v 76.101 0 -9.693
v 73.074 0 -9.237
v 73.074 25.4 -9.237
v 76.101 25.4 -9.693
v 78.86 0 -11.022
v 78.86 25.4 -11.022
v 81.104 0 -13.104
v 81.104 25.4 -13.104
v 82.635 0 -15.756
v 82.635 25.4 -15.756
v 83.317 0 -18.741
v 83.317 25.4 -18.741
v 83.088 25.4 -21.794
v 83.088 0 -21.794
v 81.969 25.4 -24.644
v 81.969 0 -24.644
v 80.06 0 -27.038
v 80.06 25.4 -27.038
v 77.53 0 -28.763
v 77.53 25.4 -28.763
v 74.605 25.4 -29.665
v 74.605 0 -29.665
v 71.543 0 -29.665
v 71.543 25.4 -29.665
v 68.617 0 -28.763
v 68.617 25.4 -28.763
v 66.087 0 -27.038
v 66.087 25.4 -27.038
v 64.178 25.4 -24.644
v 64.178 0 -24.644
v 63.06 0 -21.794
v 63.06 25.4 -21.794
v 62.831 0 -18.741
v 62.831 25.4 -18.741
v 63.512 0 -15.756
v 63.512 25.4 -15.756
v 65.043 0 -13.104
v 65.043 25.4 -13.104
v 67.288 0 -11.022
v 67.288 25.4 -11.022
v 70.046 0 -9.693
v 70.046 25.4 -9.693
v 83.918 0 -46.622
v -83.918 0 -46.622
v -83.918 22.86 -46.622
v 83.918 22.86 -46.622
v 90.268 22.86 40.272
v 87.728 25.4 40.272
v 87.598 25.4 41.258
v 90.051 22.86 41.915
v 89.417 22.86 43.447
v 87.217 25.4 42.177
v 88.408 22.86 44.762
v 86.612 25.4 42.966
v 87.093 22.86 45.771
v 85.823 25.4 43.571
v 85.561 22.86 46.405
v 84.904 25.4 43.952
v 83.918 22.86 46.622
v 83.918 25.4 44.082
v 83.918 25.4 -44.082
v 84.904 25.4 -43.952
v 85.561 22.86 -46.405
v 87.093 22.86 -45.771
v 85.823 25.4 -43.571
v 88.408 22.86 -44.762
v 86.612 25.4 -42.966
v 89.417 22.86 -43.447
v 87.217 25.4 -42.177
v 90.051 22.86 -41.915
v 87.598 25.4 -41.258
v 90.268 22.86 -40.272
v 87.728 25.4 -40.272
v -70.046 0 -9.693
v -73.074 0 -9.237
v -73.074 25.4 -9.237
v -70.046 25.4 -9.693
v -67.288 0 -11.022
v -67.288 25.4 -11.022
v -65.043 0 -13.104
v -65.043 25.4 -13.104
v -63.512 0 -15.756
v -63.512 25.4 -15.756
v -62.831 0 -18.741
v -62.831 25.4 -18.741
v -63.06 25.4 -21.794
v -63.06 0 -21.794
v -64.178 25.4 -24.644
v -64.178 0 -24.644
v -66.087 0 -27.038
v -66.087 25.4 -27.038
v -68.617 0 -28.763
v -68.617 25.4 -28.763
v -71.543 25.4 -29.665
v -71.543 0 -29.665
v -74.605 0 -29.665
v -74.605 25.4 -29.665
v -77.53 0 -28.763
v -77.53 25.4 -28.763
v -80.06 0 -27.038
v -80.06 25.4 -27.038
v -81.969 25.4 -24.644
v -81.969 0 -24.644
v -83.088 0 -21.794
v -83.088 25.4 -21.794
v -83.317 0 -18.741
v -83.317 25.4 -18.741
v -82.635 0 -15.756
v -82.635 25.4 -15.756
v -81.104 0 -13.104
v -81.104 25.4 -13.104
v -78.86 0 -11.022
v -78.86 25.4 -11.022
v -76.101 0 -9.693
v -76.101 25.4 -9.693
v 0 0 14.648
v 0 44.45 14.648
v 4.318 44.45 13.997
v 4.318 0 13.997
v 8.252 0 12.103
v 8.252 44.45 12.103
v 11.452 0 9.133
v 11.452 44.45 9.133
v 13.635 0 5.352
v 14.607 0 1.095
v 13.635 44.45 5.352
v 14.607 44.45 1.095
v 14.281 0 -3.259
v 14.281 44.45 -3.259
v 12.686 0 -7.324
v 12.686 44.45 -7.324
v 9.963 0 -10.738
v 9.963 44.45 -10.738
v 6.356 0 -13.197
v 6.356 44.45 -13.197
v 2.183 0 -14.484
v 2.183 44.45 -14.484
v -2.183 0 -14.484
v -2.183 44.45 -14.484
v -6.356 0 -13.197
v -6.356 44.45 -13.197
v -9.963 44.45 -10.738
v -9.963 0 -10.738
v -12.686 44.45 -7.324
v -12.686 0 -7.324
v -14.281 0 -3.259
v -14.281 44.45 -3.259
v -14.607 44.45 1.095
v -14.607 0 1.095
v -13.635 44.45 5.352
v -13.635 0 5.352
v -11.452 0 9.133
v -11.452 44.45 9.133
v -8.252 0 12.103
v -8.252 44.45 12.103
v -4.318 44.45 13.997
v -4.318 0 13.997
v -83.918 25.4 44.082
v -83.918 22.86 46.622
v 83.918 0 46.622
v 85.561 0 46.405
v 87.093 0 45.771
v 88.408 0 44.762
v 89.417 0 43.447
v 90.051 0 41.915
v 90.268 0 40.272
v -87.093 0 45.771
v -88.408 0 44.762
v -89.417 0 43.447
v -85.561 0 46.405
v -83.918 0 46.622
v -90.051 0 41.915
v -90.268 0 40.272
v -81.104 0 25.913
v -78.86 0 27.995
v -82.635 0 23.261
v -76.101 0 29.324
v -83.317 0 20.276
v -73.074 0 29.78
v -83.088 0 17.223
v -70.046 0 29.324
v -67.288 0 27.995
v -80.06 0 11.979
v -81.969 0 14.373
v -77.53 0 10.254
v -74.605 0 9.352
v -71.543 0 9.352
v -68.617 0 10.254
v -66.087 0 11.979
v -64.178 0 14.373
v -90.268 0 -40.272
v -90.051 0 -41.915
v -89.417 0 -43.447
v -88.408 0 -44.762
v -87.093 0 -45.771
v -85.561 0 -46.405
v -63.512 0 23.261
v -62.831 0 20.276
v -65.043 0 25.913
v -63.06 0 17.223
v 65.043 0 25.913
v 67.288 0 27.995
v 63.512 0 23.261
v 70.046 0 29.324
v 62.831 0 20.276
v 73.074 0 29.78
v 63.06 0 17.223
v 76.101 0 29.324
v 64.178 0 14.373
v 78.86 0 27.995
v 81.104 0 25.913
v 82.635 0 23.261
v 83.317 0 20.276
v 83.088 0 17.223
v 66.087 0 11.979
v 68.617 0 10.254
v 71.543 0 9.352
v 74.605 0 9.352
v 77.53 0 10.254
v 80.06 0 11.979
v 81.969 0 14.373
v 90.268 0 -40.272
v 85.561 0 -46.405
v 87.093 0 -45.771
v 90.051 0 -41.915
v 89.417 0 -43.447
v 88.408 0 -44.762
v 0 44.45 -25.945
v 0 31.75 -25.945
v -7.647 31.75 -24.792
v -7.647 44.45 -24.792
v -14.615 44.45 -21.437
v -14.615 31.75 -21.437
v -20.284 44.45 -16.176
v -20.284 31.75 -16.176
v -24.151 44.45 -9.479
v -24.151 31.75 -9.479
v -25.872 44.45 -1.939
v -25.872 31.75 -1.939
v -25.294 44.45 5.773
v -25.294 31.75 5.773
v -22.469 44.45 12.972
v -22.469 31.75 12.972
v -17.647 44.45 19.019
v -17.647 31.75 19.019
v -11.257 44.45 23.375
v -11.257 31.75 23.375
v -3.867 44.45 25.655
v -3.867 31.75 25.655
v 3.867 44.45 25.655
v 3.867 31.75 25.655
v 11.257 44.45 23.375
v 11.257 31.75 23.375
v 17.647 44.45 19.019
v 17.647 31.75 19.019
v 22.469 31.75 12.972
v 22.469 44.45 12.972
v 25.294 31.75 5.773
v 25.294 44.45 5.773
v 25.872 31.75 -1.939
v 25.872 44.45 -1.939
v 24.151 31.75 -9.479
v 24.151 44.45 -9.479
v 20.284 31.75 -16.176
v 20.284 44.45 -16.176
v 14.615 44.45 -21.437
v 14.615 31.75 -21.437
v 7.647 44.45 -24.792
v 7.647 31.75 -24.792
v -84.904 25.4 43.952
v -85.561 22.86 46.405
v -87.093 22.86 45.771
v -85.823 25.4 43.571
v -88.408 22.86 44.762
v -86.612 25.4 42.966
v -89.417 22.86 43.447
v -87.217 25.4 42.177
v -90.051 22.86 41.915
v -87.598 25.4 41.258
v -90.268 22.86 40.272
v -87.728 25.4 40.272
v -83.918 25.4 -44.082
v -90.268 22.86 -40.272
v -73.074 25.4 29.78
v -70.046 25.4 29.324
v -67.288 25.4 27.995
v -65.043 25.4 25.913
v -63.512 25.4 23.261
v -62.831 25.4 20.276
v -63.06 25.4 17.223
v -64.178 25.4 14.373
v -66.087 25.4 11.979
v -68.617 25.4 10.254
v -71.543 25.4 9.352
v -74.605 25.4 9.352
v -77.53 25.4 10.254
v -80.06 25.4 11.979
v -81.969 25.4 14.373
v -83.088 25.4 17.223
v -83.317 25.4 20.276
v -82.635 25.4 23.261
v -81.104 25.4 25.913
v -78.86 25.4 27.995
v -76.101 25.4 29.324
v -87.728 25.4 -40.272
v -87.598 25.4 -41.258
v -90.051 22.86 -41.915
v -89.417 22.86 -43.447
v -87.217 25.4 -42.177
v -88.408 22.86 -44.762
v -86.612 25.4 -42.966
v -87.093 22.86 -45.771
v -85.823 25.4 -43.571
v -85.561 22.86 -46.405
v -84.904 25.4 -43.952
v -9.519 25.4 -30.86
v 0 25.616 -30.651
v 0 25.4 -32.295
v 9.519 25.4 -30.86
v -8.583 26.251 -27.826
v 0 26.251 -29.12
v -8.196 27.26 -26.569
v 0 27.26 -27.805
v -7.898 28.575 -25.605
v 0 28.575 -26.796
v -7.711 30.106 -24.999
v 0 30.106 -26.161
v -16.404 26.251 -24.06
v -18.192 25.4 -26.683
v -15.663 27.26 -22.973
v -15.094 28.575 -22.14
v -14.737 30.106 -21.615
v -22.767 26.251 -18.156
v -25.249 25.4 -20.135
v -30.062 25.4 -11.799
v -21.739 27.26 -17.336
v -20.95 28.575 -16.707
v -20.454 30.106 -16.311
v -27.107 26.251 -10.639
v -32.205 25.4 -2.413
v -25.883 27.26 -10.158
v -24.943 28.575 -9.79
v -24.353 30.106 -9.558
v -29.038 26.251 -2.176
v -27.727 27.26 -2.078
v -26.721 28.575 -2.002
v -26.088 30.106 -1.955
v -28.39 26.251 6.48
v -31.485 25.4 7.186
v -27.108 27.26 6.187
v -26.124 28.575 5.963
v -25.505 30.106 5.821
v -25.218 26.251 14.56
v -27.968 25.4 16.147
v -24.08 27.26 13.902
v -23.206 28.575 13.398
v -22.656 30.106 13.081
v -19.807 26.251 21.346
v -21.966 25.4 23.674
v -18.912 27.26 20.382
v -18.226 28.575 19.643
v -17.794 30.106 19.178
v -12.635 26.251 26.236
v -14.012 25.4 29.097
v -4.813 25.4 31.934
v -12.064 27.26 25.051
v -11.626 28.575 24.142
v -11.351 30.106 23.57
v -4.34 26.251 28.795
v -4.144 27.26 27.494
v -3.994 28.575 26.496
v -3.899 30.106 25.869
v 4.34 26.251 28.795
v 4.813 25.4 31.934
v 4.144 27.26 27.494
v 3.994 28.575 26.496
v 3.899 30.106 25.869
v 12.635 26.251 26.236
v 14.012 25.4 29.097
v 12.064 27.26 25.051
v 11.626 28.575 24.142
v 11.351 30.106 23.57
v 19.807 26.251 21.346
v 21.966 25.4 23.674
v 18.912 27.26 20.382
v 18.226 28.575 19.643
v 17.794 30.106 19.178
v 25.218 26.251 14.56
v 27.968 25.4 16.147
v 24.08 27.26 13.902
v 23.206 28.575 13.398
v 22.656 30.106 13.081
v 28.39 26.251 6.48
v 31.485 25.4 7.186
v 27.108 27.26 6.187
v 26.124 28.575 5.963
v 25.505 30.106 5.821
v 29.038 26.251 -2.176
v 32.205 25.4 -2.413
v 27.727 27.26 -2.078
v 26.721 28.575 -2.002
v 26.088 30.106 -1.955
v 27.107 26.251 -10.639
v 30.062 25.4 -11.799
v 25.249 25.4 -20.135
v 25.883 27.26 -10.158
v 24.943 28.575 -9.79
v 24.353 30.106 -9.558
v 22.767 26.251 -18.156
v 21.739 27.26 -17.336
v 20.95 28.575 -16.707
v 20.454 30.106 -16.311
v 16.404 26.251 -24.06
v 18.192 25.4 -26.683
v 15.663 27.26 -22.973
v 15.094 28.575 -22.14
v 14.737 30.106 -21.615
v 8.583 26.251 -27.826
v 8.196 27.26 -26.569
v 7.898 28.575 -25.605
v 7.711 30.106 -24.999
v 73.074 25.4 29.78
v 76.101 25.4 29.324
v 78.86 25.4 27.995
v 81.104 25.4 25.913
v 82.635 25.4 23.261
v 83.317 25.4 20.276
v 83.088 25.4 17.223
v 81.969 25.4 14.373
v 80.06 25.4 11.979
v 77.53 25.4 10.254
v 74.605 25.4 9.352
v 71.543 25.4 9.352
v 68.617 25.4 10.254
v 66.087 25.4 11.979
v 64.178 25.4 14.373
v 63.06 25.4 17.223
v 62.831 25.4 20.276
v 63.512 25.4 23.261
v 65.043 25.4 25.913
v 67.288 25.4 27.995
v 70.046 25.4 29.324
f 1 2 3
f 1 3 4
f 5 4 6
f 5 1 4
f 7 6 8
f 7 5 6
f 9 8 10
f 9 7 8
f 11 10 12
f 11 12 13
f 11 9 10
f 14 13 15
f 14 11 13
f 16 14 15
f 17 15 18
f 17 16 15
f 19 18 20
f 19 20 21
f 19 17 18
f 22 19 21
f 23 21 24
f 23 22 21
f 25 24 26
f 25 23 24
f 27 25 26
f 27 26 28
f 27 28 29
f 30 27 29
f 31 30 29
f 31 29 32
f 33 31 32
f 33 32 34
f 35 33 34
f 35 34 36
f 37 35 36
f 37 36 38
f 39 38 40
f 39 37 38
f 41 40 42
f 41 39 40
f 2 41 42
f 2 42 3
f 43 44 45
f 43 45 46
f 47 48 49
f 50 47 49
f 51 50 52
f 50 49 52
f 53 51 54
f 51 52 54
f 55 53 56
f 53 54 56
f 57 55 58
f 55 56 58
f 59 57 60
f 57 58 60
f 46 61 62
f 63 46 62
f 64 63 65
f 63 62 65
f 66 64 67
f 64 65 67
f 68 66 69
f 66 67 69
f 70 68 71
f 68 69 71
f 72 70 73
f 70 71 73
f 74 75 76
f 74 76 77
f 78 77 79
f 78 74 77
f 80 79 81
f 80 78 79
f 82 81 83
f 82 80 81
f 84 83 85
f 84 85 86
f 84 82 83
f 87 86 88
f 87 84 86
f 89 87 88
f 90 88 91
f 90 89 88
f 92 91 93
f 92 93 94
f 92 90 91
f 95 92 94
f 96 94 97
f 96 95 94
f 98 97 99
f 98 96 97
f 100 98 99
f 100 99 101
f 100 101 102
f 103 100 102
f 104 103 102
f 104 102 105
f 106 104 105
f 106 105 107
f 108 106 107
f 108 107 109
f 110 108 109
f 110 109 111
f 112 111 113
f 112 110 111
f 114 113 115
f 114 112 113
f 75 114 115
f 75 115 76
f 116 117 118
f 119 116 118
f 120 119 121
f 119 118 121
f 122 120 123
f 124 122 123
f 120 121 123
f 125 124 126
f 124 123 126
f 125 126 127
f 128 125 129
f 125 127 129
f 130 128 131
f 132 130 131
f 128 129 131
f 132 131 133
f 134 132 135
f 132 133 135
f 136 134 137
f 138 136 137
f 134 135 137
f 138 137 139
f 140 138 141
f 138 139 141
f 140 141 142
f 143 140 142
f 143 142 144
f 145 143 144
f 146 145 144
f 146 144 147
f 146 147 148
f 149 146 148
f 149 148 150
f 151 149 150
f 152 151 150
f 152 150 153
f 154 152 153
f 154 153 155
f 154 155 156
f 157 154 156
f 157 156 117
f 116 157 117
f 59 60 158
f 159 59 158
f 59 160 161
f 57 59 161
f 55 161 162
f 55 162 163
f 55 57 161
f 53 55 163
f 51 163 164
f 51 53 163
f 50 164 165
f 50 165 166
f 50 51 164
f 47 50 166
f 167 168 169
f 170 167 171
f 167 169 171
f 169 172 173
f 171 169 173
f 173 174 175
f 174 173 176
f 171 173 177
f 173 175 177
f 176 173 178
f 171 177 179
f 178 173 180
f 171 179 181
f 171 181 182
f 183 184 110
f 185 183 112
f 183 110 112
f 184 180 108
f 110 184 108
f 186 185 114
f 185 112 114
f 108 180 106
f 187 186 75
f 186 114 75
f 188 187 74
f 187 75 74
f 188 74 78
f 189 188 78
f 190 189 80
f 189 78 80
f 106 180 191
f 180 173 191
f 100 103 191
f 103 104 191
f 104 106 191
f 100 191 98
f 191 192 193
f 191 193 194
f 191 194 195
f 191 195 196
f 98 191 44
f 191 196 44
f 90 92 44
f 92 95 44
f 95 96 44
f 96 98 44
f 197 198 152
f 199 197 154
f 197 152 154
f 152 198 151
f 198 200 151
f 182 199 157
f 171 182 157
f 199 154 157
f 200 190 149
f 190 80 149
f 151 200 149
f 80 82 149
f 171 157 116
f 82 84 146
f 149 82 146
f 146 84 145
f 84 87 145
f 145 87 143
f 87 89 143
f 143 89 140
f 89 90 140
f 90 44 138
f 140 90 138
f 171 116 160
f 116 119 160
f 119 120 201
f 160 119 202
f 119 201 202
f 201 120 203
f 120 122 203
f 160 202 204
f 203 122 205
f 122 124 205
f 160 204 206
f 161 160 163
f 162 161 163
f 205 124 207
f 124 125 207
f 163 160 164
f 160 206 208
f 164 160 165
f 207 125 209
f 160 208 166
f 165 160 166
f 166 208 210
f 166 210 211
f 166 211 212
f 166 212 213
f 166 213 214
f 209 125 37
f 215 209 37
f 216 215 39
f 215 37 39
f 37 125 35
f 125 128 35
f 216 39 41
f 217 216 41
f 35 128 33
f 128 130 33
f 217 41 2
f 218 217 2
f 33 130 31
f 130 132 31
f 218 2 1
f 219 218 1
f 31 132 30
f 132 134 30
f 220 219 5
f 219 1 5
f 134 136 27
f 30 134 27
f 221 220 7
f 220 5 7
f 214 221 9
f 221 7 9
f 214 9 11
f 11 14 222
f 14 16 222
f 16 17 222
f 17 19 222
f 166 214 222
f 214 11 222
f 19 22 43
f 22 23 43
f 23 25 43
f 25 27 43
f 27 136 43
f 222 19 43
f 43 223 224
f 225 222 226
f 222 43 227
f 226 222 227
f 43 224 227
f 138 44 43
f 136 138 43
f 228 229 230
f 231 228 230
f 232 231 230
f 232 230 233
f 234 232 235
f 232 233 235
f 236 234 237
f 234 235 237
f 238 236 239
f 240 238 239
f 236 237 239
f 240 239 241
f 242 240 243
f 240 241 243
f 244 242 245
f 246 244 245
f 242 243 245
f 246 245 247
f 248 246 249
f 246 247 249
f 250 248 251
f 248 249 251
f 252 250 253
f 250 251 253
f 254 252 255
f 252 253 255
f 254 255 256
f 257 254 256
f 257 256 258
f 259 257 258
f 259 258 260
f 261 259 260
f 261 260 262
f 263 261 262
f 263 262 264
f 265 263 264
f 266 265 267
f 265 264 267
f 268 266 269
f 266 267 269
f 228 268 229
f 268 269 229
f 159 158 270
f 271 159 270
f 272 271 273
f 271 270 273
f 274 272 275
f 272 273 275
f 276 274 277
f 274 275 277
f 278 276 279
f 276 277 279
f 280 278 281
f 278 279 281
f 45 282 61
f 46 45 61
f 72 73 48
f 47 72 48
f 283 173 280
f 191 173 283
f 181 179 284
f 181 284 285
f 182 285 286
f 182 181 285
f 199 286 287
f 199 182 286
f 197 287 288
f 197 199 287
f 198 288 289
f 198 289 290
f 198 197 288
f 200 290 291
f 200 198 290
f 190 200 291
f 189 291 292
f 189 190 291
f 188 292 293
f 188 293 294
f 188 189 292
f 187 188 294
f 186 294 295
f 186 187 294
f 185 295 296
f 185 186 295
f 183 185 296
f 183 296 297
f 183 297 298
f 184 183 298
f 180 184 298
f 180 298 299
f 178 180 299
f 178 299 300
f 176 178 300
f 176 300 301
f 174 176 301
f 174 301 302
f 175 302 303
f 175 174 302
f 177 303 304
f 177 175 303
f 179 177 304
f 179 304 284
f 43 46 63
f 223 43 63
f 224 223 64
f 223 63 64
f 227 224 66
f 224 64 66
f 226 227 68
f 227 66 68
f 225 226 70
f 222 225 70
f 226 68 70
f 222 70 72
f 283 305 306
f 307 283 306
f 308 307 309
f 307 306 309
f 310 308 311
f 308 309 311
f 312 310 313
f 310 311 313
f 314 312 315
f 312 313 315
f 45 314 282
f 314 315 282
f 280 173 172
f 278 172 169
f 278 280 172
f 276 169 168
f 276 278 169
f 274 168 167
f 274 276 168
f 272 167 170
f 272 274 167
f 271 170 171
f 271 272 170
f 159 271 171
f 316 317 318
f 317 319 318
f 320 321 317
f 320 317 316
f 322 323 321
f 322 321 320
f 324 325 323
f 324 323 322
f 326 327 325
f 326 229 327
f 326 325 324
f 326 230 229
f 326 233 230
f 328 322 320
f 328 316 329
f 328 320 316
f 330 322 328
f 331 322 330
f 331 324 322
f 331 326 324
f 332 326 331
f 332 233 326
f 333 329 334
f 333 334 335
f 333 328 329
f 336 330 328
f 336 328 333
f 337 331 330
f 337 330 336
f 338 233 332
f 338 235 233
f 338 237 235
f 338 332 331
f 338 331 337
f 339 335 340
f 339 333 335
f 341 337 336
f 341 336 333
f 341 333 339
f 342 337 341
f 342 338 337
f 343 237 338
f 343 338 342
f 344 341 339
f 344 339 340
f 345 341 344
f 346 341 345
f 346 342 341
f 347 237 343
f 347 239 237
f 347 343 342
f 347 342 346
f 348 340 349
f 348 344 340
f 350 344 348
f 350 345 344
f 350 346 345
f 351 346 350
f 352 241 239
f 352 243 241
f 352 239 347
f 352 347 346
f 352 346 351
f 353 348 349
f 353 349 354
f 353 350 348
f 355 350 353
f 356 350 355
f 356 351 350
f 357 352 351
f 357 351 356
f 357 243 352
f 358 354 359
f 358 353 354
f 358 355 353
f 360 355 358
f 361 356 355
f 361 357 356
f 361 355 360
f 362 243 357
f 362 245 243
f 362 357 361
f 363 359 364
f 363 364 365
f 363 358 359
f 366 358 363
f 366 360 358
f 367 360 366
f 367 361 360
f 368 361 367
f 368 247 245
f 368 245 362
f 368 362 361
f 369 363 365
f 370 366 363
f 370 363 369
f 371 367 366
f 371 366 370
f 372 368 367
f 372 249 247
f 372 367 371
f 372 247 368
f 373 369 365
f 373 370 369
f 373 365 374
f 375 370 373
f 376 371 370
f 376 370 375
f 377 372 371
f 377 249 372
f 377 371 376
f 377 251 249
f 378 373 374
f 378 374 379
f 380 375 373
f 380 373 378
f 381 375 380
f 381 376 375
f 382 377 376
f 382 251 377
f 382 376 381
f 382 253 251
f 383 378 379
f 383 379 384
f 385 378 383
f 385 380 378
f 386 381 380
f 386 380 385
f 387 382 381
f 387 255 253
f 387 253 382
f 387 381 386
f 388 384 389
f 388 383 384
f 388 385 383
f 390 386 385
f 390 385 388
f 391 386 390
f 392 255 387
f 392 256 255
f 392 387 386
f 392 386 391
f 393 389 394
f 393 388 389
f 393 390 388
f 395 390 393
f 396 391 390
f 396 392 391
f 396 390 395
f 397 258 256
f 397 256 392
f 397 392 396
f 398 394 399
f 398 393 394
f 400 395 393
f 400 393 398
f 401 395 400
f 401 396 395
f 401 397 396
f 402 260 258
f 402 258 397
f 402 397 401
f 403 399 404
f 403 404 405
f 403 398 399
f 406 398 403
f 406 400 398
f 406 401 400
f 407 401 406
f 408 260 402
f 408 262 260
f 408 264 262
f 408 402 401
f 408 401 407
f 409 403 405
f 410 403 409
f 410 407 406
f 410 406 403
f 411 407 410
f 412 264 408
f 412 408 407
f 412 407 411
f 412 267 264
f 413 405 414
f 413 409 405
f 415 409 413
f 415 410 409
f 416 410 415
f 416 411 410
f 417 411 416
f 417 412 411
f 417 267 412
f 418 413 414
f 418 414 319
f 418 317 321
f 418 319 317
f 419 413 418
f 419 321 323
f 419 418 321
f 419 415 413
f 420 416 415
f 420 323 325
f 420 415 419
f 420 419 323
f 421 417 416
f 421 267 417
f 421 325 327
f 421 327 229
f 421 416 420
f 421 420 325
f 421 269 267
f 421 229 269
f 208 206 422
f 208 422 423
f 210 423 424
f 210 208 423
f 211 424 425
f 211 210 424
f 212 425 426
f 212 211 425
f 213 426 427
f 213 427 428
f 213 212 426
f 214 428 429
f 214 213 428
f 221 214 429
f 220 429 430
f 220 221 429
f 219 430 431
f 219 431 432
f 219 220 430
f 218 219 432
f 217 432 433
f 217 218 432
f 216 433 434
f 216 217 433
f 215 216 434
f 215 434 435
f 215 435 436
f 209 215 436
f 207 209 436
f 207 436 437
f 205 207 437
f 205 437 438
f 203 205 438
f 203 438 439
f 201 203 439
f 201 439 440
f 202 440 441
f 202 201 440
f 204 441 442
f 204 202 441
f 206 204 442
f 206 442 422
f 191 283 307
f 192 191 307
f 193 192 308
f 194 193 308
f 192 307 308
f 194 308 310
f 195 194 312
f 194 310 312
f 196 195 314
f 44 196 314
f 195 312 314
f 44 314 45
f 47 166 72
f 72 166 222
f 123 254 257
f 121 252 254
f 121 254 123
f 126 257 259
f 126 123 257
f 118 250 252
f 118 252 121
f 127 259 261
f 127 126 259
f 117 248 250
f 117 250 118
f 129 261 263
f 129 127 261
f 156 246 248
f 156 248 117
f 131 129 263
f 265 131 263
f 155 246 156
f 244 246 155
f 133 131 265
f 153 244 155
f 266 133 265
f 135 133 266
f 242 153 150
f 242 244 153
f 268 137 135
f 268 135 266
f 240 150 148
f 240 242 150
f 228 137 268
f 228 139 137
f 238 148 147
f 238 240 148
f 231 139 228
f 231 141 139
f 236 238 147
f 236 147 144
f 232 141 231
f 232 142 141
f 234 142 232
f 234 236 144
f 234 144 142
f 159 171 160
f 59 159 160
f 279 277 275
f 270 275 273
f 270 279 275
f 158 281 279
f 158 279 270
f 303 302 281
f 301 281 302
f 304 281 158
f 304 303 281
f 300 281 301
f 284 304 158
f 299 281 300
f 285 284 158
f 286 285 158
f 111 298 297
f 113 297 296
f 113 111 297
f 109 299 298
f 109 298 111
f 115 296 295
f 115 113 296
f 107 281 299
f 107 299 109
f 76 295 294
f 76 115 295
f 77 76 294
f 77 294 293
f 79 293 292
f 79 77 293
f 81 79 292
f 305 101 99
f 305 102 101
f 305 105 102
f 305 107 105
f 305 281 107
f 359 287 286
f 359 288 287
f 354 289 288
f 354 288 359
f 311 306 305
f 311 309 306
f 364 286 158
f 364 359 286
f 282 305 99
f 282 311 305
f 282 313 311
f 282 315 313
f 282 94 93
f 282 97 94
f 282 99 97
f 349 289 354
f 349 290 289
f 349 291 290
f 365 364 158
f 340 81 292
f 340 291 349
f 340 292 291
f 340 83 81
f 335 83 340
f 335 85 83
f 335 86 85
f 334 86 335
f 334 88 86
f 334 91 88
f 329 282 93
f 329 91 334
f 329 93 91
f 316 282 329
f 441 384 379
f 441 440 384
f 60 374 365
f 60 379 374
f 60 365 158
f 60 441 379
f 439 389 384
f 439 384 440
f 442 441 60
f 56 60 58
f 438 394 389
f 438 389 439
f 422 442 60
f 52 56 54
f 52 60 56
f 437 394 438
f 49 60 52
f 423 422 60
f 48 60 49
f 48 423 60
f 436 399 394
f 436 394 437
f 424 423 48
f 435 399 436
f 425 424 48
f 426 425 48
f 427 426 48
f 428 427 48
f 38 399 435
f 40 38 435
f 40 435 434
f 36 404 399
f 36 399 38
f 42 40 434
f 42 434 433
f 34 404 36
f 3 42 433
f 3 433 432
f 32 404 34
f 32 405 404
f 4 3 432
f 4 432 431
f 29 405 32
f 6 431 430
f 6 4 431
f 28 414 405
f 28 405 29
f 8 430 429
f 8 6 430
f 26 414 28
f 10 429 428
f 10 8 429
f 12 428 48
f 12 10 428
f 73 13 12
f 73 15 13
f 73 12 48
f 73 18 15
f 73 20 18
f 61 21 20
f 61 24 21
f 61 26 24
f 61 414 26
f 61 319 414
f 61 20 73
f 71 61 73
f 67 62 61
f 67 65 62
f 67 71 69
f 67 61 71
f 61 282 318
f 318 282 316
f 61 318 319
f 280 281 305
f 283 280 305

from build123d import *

# Parameters (mm, degrees)
SKETCH1_W           = 180.535384616
SKETCH1_H           = 93.243550296
SKETCH1_R           = 10.271487678
BOSS_EXTRUDE1_DEPTH = 25.4
SKETCH2_R           = 25.944815363
BOSS_EXTRUDE2_DEPTH = 19.05
SKETCH3_R           = 14.648002934
CUT_EXTRUDE1_DEPTH  = 111.894764045
FILLET2_R           = 6.35
CHAMFER1_SIZE       = 2.54


with BuildPart() as part:
    # Sketch1 → Boss-Extrude1 (new body)
    with BuildSketch(Plane(origin=(0, 0, 0), x_dir=(1, 0, 0), z_dir=(0, 1, 0))):
        Rectangle(SKETCH1_W, SKETCH1_H)
        with Locations(Location((73.073846154, 19.508402367, 0), (0, 0, 270))):
            Circle(SKETCH1_R, mode=Mode.SUBTRACT)
        with Locations(Location((-73.073846154, 19.508402367, 0), (0, 0, 270))):
            Circle(SKETCH1_R, mode=Mode.SUBTRACT)
        with Locations(Location((73.073846154, -19.508402367, 0), (0, 0, 270))):
            Circle(SKETCH1_R, mode=Mode.SUBTRACT)
        with Locations(Location((-73.073846154, -19.508402367, 0), (0, 0, 270))):
            Circle(SKETCH1_R, mode=Mode.SUBTRACT)
    extrude(amount=BOSS_EXTRUDE1_DEPTH)

    # Sketch2 → Boss-Extrude2 (add)
    with BuildSketch(Plane(origin=(0, 25.4, 0), x_dir=(1, 0, 0), z_dir=(0, 1, 0))):
        with Locations(Location((0, 0, 0), (0, 0, 90))):
            Circle(SKETCH2_R)
    extrude(amount=BOSS_EXTRUDE2_DEPTH)

    # Sketch3 → Cut-Extrude1 (cut, through all)
    with BuildSketch(Plane(origin=(0, 44.45, 0), x_dir=(1, 0, 0), z_dir=(0, 1, 0))):
        with Locations(Location((0, 0, 0), (0, 0, 270))):
            Circle(SKETCH3_R)
    extrude(amount=-CUT_EXTRUDE1_DEPTH, mode=Mode.SUBTRACT)

    # Fillet2
    fillet2_edges = [part.edges().sort_by_distance(p)[0] for p in [
        (-90.267692308, 12.7, 46.621775148),
        (-90.267692308, 12.7, -46.621775148),
        (90.267692308, 12.7, -46.621775148),
        (90.267692308, 12.7, 46.621775148),
        (0, 25.4, 25.944815363),
    ]]
    fillet(fillet2_edges, radius=FILLET2_R)

    # Chamfer1
    chamfer1_edges = [part.edges().sort_by_distance(p)[0] for p in [
        (-90.267692308, 25.4, 0),
        (0, 25.4, -46.621775148),
        (0, 25.4, 46.621775148),
        (90.267692308, 25.4, 0),
        (-88.407820368, 25.4, 44.761903208),
        (88.407820368, 25.4, 44.761903208),
        (88.407820368, 25.4, -44.761903208),
        (-88.407820368, 25.4, -44.761903208),
    ]]
    chamfer(chamfer1_edges, length=CHAMFER1_SIZE)


solid = part.part
